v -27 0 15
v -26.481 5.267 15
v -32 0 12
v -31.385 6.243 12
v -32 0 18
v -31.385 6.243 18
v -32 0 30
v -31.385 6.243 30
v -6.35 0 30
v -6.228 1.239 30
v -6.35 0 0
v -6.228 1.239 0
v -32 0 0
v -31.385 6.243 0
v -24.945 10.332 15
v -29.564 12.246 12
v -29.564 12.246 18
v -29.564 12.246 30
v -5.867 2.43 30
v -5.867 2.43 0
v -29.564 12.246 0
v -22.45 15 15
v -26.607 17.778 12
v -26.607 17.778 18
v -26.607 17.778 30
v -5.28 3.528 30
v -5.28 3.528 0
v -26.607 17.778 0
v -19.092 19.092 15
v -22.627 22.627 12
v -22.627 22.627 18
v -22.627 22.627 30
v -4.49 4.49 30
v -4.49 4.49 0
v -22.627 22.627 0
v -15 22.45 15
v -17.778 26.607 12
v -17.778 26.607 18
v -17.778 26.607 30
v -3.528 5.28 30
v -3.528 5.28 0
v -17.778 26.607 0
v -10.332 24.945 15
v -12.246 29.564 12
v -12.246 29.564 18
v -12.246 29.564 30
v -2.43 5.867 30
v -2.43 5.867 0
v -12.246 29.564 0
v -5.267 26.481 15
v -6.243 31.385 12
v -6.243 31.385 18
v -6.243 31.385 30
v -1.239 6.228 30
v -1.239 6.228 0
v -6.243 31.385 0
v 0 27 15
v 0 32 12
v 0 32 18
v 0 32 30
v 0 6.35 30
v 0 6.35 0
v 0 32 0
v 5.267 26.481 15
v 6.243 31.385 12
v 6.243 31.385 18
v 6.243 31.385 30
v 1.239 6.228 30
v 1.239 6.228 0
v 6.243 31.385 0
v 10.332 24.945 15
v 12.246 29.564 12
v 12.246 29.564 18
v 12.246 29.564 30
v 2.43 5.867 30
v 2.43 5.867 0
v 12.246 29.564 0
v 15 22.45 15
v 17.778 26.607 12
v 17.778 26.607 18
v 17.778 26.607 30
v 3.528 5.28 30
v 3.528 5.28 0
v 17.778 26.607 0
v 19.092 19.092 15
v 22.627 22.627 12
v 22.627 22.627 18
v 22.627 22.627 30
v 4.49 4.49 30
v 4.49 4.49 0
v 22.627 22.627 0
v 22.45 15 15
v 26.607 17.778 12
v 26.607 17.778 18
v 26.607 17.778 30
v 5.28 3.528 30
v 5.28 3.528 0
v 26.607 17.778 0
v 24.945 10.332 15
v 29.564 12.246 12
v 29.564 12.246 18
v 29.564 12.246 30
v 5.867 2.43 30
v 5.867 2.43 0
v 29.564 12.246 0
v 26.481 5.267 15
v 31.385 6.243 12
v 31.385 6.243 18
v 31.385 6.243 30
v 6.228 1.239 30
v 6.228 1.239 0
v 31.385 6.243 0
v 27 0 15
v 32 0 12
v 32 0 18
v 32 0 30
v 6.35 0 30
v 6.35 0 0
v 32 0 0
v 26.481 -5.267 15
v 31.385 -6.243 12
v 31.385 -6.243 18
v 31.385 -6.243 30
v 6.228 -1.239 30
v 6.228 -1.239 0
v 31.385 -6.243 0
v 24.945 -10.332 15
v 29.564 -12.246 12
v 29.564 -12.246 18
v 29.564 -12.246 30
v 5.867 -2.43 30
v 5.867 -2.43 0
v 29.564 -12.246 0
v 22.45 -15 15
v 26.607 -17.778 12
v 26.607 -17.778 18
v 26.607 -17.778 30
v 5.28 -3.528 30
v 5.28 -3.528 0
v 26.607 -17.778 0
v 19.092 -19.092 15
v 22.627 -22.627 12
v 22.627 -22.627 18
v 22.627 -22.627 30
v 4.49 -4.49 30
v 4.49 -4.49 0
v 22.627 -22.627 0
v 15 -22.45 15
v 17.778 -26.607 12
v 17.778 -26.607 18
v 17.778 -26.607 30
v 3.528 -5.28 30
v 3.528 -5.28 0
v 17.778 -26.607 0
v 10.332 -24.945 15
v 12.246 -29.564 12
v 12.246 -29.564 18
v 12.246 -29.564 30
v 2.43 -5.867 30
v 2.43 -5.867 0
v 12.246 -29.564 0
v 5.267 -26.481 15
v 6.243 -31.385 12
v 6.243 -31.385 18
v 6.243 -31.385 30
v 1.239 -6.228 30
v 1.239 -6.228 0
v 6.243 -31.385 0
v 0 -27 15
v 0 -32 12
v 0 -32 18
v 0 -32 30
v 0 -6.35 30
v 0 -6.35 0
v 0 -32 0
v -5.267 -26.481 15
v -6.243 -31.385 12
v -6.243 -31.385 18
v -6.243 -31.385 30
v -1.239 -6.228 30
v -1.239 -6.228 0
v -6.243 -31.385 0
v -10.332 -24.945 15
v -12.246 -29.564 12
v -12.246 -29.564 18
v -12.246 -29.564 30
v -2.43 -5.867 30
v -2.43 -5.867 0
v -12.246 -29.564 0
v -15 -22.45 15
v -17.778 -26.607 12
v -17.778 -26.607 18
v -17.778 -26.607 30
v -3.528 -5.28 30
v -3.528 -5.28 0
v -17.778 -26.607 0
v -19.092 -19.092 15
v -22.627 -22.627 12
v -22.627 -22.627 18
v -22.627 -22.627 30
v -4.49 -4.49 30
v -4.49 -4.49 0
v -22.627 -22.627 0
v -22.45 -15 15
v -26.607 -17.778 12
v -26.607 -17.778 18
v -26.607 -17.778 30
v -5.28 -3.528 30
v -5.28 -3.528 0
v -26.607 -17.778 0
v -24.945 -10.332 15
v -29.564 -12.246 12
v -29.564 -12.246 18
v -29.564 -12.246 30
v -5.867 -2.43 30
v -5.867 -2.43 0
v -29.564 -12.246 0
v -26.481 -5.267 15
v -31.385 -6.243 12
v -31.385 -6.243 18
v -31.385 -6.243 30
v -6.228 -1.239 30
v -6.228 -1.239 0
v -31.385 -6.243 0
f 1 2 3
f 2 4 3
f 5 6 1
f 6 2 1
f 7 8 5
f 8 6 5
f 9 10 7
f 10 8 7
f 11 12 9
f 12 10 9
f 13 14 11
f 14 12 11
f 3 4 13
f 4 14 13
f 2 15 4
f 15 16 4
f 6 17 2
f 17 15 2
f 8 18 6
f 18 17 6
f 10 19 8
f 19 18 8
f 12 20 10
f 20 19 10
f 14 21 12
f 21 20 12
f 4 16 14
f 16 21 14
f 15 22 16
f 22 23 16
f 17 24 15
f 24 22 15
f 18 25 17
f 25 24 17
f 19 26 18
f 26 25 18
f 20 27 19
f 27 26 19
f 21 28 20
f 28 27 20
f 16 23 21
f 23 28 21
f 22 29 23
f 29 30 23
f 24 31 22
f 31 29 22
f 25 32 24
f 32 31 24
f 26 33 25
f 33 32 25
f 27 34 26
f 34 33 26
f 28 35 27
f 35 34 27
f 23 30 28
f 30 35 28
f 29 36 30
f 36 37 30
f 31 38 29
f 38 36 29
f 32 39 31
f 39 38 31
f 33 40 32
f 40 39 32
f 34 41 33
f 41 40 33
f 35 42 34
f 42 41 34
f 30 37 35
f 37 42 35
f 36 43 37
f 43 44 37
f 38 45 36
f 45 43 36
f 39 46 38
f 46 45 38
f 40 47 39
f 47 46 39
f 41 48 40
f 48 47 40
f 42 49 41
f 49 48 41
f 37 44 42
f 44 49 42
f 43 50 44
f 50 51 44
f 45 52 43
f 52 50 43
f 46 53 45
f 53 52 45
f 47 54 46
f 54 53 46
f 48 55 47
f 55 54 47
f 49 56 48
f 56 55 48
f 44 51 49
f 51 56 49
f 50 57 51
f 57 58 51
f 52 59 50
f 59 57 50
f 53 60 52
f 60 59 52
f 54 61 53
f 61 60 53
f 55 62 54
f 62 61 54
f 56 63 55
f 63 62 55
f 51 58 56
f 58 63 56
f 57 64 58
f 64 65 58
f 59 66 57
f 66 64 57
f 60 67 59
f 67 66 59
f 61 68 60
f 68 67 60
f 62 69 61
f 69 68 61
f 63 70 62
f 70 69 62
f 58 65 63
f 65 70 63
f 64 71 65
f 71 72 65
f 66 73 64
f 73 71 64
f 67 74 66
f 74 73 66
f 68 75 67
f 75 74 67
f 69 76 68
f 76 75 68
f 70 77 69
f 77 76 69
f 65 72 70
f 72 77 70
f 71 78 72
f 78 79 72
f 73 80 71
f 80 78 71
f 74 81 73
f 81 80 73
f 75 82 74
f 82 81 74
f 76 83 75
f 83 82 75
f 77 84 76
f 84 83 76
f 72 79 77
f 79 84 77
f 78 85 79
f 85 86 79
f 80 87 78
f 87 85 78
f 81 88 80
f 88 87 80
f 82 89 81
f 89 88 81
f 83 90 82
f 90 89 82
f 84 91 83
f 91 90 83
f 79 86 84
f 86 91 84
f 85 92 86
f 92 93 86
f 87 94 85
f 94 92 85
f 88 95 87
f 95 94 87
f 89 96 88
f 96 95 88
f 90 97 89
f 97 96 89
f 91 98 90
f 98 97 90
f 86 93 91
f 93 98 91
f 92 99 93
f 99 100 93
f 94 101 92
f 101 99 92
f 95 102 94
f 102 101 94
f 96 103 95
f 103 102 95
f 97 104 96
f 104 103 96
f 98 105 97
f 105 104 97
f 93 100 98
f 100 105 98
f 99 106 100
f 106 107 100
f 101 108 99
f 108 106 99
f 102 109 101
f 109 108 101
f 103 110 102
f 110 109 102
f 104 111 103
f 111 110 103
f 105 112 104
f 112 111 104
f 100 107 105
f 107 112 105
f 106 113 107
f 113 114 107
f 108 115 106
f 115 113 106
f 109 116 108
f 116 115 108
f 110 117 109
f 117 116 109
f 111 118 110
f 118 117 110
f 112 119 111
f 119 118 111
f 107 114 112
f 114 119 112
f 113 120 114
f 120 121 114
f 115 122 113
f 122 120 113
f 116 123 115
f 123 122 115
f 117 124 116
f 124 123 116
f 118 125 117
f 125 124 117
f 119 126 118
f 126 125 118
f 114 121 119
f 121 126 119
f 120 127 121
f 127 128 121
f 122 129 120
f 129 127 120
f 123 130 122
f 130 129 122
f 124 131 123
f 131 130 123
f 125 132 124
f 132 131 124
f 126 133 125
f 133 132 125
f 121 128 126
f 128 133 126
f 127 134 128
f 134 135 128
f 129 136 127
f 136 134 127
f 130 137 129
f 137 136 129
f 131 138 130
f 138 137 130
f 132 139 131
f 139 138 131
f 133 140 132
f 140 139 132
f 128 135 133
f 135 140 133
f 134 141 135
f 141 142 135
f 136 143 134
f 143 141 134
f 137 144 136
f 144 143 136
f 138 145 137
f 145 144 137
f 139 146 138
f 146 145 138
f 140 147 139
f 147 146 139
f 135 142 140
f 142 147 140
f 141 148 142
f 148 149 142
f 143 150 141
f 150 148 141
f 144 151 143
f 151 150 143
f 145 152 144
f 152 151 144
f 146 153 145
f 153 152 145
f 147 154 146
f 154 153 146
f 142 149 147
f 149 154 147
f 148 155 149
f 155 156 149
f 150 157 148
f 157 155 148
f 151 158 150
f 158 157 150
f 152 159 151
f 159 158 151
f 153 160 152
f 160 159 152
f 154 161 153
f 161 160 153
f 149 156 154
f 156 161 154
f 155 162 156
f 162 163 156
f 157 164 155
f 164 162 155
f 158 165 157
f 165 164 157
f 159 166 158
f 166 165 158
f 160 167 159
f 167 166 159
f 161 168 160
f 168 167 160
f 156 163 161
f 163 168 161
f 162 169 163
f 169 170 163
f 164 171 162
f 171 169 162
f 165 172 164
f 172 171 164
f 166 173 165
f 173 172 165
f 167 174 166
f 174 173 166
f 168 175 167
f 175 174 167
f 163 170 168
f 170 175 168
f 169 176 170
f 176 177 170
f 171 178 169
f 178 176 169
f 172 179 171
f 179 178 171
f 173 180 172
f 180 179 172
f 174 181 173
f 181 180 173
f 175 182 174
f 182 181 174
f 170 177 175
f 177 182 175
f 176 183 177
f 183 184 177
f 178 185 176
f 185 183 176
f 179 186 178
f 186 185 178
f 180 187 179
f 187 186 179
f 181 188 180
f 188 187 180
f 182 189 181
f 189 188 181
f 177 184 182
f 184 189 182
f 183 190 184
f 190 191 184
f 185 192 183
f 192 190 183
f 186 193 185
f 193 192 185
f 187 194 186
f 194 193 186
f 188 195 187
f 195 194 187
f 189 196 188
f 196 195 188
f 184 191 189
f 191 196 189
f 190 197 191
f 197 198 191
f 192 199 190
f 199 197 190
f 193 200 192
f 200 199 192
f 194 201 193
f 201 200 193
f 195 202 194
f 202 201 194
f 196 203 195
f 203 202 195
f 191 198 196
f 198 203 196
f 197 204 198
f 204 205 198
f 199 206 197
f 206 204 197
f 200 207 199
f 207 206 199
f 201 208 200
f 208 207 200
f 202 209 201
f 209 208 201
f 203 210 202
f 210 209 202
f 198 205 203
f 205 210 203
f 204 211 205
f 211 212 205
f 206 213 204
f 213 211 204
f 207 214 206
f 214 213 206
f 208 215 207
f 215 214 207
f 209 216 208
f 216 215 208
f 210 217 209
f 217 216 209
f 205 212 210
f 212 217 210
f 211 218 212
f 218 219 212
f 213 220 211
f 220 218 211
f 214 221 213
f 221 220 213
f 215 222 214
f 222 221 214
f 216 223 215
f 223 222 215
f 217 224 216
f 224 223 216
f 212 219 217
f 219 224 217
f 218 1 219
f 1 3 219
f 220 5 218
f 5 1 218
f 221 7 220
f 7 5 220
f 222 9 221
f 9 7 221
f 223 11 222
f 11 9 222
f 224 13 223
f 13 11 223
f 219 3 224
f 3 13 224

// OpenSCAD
$fn = 32;

// ----------------------------------------------------------------------
// Belt roller: 64 mm barrel, 30 mm wide, bore 12.7 mm
// ----------------------------------------------------------------------

// --- parameters (mm) ---
bore_d = 12.7;            // bore
barrel_d = 64;            // barrel diameter
roller_w = 30;            // roller width
groove_w = 6;             // guide groove width
groove_d = 5;             // guide groove depth

roller_profile = [[6.35, 0], [32, 0], [32, 12], [27, 15], [32, 18], [32, 30], [6.35, 30]];

/* the profile stays clear of the axis, so the bore comes out of the revolve */
rotate_extrude() polygon(roller_profile);
